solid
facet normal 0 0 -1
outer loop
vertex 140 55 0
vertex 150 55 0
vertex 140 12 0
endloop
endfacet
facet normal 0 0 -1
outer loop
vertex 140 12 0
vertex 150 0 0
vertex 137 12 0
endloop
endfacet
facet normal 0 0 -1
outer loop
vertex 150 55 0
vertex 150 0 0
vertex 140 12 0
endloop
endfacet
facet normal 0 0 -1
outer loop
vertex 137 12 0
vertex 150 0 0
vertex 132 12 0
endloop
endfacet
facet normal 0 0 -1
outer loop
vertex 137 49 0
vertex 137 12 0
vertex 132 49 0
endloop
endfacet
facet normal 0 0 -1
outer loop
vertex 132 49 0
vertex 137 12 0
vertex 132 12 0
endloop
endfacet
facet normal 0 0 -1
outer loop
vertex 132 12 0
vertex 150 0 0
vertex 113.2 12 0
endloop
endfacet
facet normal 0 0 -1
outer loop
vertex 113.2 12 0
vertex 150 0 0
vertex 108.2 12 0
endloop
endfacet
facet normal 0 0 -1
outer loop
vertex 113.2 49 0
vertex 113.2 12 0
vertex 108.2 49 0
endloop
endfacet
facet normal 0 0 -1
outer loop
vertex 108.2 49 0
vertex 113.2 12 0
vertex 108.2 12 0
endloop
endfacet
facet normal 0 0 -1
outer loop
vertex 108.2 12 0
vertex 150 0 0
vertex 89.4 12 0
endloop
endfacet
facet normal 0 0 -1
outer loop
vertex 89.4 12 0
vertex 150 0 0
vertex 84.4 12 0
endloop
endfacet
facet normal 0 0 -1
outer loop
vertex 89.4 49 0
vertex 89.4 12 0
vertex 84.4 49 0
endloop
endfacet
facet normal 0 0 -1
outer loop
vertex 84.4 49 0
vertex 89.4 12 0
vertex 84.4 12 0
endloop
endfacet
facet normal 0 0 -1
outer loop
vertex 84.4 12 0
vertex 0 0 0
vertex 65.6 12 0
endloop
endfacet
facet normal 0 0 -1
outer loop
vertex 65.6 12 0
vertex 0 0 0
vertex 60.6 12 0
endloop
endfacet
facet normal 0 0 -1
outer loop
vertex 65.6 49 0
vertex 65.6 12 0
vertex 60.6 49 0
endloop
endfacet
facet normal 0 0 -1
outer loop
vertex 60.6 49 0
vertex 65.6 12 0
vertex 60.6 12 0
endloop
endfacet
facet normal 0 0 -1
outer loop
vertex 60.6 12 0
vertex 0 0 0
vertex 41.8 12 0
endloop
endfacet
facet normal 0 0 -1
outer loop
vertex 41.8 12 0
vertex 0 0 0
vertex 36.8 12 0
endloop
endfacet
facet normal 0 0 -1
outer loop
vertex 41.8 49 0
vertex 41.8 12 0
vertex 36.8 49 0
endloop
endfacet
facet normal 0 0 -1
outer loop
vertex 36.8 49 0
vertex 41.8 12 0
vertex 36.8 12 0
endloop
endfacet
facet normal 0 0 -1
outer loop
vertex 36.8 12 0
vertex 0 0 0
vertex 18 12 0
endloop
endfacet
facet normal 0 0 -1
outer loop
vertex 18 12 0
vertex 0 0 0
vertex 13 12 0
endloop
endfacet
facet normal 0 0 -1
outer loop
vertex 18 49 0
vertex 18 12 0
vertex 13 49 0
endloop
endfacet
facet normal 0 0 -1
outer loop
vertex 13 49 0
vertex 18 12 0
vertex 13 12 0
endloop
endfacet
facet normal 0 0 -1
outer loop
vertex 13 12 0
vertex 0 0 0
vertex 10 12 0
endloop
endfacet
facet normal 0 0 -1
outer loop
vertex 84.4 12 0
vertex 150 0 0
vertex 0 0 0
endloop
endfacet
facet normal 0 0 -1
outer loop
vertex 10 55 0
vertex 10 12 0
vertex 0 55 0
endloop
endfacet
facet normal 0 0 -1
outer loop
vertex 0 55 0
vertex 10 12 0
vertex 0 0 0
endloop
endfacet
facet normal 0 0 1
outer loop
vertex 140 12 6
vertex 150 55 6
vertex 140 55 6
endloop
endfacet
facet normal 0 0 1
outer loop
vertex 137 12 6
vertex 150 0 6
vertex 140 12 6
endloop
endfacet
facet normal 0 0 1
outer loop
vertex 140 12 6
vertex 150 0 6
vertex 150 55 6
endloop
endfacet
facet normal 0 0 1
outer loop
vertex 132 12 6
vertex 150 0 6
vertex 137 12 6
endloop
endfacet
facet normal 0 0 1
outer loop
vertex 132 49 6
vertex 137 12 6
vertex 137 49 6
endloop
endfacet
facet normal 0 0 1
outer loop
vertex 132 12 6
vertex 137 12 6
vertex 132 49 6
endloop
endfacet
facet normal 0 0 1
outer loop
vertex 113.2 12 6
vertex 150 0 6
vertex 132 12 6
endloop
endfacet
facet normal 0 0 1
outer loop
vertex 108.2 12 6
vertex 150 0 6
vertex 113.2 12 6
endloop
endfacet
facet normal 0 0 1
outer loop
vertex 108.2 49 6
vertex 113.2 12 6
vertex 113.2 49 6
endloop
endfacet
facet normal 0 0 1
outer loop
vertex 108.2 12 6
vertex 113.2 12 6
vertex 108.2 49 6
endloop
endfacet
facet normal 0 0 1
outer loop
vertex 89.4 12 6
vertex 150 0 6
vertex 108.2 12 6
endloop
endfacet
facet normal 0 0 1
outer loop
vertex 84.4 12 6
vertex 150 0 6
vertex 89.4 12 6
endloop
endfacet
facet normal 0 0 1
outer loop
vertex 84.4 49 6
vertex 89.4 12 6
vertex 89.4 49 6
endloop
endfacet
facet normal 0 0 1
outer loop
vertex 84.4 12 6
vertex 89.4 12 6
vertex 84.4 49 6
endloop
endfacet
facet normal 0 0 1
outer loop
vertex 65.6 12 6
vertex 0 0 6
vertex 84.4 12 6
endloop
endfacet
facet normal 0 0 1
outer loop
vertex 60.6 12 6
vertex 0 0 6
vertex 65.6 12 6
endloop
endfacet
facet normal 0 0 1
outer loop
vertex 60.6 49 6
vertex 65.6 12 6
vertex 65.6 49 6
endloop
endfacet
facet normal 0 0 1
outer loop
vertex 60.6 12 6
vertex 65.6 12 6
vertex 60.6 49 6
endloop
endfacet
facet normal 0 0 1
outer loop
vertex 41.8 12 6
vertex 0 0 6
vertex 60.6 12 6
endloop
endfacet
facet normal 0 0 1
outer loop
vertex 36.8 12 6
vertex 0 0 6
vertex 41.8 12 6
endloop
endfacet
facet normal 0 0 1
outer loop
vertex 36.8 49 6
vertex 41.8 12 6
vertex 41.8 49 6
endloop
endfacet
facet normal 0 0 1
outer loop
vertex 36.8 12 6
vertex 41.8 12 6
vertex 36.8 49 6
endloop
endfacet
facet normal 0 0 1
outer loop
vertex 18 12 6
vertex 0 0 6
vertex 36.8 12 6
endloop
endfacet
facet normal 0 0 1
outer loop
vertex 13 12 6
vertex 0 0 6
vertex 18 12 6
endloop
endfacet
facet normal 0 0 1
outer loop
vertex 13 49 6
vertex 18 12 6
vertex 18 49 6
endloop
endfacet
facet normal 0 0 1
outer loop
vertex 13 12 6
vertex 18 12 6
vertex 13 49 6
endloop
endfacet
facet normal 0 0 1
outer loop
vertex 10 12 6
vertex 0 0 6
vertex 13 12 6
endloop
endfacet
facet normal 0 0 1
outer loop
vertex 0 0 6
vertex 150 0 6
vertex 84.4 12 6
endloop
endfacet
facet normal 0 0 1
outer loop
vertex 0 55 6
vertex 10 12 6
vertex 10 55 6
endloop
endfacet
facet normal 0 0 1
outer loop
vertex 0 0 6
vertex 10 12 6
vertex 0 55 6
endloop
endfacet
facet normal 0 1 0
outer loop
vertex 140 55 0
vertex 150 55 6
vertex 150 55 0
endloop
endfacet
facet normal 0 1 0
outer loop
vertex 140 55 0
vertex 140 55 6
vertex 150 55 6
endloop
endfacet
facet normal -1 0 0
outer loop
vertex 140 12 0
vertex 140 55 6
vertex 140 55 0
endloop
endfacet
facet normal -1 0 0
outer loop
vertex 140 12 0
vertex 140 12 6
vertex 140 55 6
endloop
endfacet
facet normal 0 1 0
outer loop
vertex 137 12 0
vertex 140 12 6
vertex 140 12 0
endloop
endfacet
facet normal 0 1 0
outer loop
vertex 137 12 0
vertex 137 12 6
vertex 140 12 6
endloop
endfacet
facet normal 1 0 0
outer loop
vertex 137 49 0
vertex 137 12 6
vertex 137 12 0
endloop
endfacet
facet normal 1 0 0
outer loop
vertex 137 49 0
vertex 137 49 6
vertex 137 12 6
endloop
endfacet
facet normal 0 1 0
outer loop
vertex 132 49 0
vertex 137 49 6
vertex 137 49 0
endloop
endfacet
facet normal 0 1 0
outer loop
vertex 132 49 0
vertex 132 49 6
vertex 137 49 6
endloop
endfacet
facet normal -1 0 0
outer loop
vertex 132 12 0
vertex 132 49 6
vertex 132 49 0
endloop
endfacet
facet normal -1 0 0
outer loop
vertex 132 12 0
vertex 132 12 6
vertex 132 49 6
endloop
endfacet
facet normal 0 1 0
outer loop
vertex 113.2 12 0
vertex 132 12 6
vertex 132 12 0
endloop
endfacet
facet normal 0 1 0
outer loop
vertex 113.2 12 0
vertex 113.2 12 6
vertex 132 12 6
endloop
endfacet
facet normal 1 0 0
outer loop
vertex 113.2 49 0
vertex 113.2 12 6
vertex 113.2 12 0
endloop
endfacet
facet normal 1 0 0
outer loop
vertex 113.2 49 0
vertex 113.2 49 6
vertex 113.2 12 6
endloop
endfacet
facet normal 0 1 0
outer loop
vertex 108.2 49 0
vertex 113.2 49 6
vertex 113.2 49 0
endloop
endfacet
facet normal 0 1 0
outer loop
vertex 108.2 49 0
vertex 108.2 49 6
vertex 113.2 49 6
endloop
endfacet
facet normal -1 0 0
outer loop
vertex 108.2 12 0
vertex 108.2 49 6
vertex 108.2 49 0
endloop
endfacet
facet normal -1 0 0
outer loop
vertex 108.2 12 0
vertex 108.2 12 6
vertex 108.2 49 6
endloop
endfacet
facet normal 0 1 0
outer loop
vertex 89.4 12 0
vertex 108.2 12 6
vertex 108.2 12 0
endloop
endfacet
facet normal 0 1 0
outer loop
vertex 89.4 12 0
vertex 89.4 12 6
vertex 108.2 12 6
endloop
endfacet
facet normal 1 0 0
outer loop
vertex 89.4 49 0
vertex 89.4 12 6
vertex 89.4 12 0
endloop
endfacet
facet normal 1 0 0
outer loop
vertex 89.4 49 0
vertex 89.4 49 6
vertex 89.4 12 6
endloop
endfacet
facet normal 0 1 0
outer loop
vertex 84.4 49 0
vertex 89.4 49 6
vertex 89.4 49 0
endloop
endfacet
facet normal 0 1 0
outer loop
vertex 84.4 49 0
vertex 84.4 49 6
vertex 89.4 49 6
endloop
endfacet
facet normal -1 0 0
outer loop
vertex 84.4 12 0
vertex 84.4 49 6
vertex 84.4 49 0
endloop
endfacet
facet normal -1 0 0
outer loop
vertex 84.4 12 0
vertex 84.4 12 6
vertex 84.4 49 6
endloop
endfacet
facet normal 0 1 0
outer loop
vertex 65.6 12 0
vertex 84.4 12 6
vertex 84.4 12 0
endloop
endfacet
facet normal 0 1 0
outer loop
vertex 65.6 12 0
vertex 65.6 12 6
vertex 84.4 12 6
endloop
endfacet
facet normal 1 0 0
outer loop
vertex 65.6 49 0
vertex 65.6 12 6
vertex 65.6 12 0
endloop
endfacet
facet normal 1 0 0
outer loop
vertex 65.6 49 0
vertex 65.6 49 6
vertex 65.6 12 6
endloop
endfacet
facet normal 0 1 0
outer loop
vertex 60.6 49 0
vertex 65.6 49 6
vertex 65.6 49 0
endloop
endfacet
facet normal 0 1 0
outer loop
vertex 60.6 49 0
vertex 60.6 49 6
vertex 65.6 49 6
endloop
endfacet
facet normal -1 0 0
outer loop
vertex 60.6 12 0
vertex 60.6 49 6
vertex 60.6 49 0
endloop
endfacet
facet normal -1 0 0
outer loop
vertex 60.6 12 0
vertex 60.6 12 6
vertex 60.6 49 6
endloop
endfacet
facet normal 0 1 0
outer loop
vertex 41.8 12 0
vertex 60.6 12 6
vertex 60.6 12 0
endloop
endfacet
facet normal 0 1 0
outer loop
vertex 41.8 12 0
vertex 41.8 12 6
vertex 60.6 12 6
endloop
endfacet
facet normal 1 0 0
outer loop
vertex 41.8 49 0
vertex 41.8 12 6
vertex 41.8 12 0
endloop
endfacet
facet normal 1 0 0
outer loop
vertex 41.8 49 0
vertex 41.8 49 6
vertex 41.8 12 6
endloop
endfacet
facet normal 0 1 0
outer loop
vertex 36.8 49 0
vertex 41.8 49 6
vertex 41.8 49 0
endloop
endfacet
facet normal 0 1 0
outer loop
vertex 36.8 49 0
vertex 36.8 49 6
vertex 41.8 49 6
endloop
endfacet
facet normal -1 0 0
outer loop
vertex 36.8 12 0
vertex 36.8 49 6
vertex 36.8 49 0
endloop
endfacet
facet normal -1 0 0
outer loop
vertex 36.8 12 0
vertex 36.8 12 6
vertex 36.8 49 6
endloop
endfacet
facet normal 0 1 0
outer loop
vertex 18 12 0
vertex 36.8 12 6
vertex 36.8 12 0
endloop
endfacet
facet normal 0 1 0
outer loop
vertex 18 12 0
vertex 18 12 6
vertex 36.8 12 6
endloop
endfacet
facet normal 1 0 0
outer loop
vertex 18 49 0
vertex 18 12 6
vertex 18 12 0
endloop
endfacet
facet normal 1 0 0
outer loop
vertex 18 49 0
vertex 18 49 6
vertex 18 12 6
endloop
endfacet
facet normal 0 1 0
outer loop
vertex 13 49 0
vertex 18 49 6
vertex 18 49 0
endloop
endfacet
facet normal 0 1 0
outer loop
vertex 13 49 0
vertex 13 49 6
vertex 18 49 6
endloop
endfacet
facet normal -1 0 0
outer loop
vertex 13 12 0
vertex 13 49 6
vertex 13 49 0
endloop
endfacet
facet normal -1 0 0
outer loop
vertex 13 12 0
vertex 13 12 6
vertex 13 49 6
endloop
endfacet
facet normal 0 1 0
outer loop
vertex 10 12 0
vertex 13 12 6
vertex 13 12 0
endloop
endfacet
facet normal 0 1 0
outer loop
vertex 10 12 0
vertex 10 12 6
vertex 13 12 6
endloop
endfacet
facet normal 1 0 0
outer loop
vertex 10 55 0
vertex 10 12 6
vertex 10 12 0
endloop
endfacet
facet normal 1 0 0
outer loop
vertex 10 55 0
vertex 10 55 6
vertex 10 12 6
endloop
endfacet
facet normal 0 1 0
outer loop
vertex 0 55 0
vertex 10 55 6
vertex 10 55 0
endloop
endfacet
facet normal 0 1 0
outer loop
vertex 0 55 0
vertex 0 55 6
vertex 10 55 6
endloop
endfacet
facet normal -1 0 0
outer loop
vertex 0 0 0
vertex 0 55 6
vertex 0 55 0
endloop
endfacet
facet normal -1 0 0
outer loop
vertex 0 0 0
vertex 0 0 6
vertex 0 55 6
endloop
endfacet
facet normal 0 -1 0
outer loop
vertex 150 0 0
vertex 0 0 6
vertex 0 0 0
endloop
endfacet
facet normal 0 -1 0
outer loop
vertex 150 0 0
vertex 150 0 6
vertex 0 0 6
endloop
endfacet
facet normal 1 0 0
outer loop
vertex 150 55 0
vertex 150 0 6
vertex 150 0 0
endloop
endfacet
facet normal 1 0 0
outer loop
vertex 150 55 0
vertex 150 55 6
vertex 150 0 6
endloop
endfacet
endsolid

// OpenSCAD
$fn = 32;

// ----------------------------------------------------------------------
// Guard grille: 6 slats over a 150 x 55 mm plate
// ----------------------------------------------------------------------

// --- parameters (mm) ---
profile_height = 6;       // extrusion height
profile_points = 32;      // points of the closed outline

profile = [[0, 0], [150, 0], [150, 55], [140, 55], [140, 12], [137, 12], [137, 49], [132, 49], [132, 12], [113.2, 12], [113.2, 49], [108.2, 49], [108.2, 12], [89.4, 12], [89.4, 49], [84.4, 49], [84.4, 12], [65.6, 12], [65.6, 49], [60.6, 49], [60.6, 12], [41.8, 12], [41.8, 49], [36.8, 49], [36.8, 12], [18, 12], [18, 49], [13, 49], [13, 12], [10, 12], [10, 55], [0, 55]];  // single closed polygon, 32 points, counter clockwise

// --- the one profile operation ---
linear_extrude(height = profile_height) polygon(points = profile);
